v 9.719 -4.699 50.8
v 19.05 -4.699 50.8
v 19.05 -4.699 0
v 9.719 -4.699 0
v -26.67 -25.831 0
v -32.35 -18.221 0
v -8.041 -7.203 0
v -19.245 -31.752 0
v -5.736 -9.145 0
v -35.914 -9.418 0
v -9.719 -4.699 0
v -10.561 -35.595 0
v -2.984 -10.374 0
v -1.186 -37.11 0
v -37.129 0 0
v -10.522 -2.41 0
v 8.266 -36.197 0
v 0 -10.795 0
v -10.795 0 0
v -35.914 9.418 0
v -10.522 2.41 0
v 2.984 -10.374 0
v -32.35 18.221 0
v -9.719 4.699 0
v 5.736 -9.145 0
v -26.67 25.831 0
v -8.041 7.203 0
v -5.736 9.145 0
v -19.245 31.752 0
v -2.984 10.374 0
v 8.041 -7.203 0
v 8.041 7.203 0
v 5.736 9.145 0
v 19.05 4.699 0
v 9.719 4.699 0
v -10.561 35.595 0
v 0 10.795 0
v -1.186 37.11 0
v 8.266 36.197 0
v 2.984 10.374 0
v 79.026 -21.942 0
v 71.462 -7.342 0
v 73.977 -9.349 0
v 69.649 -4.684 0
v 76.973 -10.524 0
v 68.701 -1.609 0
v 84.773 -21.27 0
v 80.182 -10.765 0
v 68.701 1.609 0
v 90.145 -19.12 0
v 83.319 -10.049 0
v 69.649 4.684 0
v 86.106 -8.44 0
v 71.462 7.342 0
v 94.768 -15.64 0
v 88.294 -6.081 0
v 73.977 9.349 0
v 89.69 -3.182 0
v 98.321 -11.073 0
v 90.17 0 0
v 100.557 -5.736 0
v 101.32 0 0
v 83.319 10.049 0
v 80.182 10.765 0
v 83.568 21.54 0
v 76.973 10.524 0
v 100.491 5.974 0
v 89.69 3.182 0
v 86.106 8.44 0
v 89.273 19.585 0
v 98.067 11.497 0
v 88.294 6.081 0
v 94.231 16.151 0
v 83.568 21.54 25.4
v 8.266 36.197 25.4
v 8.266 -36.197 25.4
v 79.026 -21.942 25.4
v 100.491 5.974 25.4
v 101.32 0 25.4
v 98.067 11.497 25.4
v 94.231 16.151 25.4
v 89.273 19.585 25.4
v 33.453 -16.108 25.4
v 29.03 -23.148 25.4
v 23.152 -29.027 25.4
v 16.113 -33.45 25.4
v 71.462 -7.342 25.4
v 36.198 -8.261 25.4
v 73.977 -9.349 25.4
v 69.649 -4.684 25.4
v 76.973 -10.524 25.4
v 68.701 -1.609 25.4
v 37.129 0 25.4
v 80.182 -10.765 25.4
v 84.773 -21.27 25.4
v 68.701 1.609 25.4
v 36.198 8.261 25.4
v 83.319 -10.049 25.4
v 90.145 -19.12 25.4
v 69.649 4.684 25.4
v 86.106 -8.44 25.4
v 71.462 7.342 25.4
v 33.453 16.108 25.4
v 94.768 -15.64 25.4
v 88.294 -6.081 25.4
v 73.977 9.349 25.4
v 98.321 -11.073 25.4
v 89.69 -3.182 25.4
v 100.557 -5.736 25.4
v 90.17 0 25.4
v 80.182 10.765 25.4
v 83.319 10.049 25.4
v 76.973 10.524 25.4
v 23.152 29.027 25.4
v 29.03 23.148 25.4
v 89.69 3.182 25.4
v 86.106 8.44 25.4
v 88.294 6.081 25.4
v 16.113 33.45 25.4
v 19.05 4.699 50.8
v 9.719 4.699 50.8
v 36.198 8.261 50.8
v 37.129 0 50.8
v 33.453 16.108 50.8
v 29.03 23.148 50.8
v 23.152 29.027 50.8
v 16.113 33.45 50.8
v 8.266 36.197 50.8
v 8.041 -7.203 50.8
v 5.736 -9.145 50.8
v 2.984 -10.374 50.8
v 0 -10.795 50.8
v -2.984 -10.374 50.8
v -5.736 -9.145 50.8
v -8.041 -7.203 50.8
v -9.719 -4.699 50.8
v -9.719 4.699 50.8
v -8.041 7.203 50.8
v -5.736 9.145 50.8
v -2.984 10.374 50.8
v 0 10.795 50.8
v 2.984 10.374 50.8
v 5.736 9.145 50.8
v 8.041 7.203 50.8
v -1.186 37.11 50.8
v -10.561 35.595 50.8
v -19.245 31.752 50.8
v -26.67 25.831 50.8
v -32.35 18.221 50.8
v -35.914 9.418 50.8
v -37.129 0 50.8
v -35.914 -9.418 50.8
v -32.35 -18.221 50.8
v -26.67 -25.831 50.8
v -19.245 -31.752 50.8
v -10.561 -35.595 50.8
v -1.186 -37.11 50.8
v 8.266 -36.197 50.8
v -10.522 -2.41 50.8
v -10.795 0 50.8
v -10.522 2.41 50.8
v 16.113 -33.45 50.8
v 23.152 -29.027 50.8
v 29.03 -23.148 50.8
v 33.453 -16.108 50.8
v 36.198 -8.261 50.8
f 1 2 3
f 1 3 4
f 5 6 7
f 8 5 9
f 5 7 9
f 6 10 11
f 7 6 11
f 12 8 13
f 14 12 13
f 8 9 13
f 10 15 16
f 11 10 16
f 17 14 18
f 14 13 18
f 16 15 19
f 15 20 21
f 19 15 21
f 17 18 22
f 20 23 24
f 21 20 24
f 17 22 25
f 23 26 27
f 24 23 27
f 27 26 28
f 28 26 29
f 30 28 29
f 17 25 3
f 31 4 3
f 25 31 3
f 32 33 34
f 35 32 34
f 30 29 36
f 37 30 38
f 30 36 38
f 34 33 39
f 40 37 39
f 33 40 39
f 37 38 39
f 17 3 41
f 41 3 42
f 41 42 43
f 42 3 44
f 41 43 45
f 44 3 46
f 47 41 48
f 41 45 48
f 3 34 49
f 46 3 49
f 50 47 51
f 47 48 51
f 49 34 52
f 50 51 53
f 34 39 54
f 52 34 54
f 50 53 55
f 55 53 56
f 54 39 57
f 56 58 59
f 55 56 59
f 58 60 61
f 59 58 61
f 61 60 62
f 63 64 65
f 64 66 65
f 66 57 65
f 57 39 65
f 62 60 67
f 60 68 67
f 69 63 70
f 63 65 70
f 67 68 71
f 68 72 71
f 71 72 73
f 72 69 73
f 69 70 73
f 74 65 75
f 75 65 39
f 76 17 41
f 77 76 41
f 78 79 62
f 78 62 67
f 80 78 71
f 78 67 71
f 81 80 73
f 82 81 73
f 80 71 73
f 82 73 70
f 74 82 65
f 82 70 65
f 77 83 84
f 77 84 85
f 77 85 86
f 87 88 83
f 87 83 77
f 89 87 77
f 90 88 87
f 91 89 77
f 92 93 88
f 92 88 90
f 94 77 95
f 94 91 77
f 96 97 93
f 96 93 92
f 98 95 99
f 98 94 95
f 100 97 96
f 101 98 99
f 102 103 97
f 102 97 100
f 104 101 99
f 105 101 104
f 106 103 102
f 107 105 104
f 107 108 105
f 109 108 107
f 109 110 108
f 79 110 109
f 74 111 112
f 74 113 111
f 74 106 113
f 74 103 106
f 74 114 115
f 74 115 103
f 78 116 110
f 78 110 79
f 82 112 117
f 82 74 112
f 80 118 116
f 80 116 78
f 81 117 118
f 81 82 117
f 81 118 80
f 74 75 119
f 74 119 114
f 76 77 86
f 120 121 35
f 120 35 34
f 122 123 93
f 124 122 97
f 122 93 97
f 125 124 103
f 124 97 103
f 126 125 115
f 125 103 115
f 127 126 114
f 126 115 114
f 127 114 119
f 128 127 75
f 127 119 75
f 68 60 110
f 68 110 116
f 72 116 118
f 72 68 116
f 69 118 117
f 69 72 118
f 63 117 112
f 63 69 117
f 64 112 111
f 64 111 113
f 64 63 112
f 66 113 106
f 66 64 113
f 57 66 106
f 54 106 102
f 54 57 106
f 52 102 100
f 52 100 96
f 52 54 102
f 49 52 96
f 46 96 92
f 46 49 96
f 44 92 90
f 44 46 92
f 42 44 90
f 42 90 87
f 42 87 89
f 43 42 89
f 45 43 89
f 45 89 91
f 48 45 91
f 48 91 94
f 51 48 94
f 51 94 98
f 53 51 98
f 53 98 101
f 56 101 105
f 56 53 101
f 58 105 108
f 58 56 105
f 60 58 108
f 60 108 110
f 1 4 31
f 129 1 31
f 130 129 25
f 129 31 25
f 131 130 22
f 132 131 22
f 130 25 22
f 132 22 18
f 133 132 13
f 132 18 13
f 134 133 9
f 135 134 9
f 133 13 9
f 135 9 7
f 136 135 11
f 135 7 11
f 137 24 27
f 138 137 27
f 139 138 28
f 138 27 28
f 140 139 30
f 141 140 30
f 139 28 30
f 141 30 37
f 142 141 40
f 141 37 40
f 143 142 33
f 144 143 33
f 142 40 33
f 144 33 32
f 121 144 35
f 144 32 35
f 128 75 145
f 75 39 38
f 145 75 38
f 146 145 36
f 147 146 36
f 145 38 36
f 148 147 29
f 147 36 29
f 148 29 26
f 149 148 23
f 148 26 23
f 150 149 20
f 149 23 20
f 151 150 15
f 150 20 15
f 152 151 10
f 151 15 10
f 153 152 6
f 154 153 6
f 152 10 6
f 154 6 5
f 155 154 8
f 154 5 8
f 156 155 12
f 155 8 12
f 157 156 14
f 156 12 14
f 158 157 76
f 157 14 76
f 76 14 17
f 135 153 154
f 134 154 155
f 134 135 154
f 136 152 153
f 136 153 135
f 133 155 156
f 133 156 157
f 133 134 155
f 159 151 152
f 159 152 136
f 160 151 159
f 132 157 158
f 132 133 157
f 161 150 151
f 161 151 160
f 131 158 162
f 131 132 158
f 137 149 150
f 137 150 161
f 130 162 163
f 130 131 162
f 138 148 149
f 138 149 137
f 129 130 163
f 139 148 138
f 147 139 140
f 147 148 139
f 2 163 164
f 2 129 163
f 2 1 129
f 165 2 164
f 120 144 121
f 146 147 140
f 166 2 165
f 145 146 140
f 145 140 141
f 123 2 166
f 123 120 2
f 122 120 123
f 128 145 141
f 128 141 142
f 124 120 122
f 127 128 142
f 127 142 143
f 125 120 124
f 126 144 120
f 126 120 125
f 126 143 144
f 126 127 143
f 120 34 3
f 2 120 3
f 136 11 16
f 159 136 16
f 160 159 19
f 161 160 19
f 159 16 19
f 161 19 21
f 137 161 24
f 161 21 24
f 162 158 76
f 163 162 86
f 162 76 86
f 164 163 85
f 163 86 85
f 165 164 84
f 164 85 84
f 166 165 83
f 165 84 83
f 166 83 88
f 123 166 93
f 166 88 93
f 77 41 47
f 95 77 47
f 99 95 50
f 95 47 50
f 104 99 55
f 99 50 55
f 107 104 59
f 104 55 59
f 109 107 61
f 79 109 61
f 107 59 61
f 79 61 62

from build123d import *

# Parameters (mm, degrees)
F0_R     = 10.795
F1_DEPTH = 25.4
F2_DEPTH = 50.8


with BuildPart() as f1:
    # F0 (on Top) → F1 (new body)
    with BuildSketch(Plane.XY):
        with BuildLine():
            ThreePointArc((-9.718612, -4.699), (-10.795, 0), (-9.718612, 4.699))
            Line((-9.718612, 4.699), (-19.05, 4.699))
            Line((-19.05, 4.699), (-19.05, -4.699))
            Line((-19.05, -4.699), (-9.718612, -4.699))
        make_face()
        with BuildLine():
            ThreePointArc((8.266151, -36.196979), (29.029839, -23.147764), (37.128837, 0))
            ThreePointArc((37.128837, 0), (29.029839, 23.147764), (8.266151, 36.196979))
            ThreePointArc((8.266151, 36.196979), (-37.128837, 0), (8.266151, -36.196979))
        make_face()
        with BuildLine():
            ThreePointArc((-9.718612, 4.699), (0, 10.795), (9.718612, 4.699))
            Line((9.718612, 4.699), (19.05, 4.699))
            Line((19.05, 4.699), (19.05, -4.699))
            Line((19.05, -4.699), (9.718612, -4.699))
            ThreePointArc((9.718612, -4.699), (0, -10.795), (-9.718612, -4.699))
            Line((-9.718612, -4.699), (-19.05, -4.699))
            Line((-19.05, -4.699), (-19.05, 4.699))
            Line((-19.05, 4.699), (-9.718612, 4.699))
        make_face(mode=Mode.SUBTRACT)
        with BuildLine():
            ThreePointArc((101.319549, 0), (96.309698, 13.956332), (83.567604, 21.540318))
            ThreePointArc((83.567604, 21.540318), (57.549179, 2.279634), (79.026044, -21.941774))
            ThreePointArc((79.026044, -21.941774), (94.76827, -15.640027), (101.319549, 0))
        make_face()
        with Locations((79.375, 0)):
            Circle(F0_R, mode=Mode.SUBTRACT)
        with BuildLine():
            ThreePointArc((8.266151, 36.196979), (29.029839, 23.147764), (37.128837, 0))
            ThreePointArc((37.128837, 0), (29.029839, -23.147764), (8.266151, -36.196979))
            Line((8.266151, -36.196979), (79.026044, -21.941774))
            ThreePointArc((79.026044, -21.941774), (57.549179, 2.279634), (83.567604, 21.540318))
            Line((83.567604, 21.540318), (8.266151, 36.196979))
        make_face()
    extrude(amount=F1_DEPTH)

    # F0 (on Top) → F2 (join)
    with BuildSketch(Plane.XY):
        with BuildLine():
            ThreePointArc((8.266151, -36.196979), (29.029839, -23.147764), (37.128837, 0))
            ThreePointArc((37.128837, 0), (29.029839, 23.147764), (8.266151, 36.196979))
            ThreePointArc((8.266151, 36.196979), (-37.128837, 0), (8.266151, -36.196979))
        make_face()
        with BuildLine():
            ThreePointArc((-9.718612, 4.699), (0, 10.795), (9.718612, 4.699))
            Line((9.718612, 4.699), (19.05, 4.699))
            Line((19.05, 4.699), (19.05, -4.699))
            Line((19.05, -4.699), (9.718612, -4.699))
            ThreePointArc((9.718612, -4.699), (0, -10.795), (-9.718612, -4.699))
            Line((-9.718612, -4.699), (-19.05, -4.699))
            Line((-19.05, -4.699), (-19.05, 4.699))
            Line((-19.05, 4.699), (-9.718612, 4.699))
        make_face(mode=Mode.SUBTRACT)
        with BuildLine():
            ThreePointArc((-9.718612, -4.699), (-10.795, 0), (-9.718612, 4.699))
            Line((-9.718612, 4.699), (-19.05, 4.699))
            Line((-19.05, 4.699), (-19.05, -4.699))
            Line((-19.05, -4.699), (-9.718612, -4.699))
        make_face()
    extrude(amount=F2_DEPTH)


solid = f1.part
